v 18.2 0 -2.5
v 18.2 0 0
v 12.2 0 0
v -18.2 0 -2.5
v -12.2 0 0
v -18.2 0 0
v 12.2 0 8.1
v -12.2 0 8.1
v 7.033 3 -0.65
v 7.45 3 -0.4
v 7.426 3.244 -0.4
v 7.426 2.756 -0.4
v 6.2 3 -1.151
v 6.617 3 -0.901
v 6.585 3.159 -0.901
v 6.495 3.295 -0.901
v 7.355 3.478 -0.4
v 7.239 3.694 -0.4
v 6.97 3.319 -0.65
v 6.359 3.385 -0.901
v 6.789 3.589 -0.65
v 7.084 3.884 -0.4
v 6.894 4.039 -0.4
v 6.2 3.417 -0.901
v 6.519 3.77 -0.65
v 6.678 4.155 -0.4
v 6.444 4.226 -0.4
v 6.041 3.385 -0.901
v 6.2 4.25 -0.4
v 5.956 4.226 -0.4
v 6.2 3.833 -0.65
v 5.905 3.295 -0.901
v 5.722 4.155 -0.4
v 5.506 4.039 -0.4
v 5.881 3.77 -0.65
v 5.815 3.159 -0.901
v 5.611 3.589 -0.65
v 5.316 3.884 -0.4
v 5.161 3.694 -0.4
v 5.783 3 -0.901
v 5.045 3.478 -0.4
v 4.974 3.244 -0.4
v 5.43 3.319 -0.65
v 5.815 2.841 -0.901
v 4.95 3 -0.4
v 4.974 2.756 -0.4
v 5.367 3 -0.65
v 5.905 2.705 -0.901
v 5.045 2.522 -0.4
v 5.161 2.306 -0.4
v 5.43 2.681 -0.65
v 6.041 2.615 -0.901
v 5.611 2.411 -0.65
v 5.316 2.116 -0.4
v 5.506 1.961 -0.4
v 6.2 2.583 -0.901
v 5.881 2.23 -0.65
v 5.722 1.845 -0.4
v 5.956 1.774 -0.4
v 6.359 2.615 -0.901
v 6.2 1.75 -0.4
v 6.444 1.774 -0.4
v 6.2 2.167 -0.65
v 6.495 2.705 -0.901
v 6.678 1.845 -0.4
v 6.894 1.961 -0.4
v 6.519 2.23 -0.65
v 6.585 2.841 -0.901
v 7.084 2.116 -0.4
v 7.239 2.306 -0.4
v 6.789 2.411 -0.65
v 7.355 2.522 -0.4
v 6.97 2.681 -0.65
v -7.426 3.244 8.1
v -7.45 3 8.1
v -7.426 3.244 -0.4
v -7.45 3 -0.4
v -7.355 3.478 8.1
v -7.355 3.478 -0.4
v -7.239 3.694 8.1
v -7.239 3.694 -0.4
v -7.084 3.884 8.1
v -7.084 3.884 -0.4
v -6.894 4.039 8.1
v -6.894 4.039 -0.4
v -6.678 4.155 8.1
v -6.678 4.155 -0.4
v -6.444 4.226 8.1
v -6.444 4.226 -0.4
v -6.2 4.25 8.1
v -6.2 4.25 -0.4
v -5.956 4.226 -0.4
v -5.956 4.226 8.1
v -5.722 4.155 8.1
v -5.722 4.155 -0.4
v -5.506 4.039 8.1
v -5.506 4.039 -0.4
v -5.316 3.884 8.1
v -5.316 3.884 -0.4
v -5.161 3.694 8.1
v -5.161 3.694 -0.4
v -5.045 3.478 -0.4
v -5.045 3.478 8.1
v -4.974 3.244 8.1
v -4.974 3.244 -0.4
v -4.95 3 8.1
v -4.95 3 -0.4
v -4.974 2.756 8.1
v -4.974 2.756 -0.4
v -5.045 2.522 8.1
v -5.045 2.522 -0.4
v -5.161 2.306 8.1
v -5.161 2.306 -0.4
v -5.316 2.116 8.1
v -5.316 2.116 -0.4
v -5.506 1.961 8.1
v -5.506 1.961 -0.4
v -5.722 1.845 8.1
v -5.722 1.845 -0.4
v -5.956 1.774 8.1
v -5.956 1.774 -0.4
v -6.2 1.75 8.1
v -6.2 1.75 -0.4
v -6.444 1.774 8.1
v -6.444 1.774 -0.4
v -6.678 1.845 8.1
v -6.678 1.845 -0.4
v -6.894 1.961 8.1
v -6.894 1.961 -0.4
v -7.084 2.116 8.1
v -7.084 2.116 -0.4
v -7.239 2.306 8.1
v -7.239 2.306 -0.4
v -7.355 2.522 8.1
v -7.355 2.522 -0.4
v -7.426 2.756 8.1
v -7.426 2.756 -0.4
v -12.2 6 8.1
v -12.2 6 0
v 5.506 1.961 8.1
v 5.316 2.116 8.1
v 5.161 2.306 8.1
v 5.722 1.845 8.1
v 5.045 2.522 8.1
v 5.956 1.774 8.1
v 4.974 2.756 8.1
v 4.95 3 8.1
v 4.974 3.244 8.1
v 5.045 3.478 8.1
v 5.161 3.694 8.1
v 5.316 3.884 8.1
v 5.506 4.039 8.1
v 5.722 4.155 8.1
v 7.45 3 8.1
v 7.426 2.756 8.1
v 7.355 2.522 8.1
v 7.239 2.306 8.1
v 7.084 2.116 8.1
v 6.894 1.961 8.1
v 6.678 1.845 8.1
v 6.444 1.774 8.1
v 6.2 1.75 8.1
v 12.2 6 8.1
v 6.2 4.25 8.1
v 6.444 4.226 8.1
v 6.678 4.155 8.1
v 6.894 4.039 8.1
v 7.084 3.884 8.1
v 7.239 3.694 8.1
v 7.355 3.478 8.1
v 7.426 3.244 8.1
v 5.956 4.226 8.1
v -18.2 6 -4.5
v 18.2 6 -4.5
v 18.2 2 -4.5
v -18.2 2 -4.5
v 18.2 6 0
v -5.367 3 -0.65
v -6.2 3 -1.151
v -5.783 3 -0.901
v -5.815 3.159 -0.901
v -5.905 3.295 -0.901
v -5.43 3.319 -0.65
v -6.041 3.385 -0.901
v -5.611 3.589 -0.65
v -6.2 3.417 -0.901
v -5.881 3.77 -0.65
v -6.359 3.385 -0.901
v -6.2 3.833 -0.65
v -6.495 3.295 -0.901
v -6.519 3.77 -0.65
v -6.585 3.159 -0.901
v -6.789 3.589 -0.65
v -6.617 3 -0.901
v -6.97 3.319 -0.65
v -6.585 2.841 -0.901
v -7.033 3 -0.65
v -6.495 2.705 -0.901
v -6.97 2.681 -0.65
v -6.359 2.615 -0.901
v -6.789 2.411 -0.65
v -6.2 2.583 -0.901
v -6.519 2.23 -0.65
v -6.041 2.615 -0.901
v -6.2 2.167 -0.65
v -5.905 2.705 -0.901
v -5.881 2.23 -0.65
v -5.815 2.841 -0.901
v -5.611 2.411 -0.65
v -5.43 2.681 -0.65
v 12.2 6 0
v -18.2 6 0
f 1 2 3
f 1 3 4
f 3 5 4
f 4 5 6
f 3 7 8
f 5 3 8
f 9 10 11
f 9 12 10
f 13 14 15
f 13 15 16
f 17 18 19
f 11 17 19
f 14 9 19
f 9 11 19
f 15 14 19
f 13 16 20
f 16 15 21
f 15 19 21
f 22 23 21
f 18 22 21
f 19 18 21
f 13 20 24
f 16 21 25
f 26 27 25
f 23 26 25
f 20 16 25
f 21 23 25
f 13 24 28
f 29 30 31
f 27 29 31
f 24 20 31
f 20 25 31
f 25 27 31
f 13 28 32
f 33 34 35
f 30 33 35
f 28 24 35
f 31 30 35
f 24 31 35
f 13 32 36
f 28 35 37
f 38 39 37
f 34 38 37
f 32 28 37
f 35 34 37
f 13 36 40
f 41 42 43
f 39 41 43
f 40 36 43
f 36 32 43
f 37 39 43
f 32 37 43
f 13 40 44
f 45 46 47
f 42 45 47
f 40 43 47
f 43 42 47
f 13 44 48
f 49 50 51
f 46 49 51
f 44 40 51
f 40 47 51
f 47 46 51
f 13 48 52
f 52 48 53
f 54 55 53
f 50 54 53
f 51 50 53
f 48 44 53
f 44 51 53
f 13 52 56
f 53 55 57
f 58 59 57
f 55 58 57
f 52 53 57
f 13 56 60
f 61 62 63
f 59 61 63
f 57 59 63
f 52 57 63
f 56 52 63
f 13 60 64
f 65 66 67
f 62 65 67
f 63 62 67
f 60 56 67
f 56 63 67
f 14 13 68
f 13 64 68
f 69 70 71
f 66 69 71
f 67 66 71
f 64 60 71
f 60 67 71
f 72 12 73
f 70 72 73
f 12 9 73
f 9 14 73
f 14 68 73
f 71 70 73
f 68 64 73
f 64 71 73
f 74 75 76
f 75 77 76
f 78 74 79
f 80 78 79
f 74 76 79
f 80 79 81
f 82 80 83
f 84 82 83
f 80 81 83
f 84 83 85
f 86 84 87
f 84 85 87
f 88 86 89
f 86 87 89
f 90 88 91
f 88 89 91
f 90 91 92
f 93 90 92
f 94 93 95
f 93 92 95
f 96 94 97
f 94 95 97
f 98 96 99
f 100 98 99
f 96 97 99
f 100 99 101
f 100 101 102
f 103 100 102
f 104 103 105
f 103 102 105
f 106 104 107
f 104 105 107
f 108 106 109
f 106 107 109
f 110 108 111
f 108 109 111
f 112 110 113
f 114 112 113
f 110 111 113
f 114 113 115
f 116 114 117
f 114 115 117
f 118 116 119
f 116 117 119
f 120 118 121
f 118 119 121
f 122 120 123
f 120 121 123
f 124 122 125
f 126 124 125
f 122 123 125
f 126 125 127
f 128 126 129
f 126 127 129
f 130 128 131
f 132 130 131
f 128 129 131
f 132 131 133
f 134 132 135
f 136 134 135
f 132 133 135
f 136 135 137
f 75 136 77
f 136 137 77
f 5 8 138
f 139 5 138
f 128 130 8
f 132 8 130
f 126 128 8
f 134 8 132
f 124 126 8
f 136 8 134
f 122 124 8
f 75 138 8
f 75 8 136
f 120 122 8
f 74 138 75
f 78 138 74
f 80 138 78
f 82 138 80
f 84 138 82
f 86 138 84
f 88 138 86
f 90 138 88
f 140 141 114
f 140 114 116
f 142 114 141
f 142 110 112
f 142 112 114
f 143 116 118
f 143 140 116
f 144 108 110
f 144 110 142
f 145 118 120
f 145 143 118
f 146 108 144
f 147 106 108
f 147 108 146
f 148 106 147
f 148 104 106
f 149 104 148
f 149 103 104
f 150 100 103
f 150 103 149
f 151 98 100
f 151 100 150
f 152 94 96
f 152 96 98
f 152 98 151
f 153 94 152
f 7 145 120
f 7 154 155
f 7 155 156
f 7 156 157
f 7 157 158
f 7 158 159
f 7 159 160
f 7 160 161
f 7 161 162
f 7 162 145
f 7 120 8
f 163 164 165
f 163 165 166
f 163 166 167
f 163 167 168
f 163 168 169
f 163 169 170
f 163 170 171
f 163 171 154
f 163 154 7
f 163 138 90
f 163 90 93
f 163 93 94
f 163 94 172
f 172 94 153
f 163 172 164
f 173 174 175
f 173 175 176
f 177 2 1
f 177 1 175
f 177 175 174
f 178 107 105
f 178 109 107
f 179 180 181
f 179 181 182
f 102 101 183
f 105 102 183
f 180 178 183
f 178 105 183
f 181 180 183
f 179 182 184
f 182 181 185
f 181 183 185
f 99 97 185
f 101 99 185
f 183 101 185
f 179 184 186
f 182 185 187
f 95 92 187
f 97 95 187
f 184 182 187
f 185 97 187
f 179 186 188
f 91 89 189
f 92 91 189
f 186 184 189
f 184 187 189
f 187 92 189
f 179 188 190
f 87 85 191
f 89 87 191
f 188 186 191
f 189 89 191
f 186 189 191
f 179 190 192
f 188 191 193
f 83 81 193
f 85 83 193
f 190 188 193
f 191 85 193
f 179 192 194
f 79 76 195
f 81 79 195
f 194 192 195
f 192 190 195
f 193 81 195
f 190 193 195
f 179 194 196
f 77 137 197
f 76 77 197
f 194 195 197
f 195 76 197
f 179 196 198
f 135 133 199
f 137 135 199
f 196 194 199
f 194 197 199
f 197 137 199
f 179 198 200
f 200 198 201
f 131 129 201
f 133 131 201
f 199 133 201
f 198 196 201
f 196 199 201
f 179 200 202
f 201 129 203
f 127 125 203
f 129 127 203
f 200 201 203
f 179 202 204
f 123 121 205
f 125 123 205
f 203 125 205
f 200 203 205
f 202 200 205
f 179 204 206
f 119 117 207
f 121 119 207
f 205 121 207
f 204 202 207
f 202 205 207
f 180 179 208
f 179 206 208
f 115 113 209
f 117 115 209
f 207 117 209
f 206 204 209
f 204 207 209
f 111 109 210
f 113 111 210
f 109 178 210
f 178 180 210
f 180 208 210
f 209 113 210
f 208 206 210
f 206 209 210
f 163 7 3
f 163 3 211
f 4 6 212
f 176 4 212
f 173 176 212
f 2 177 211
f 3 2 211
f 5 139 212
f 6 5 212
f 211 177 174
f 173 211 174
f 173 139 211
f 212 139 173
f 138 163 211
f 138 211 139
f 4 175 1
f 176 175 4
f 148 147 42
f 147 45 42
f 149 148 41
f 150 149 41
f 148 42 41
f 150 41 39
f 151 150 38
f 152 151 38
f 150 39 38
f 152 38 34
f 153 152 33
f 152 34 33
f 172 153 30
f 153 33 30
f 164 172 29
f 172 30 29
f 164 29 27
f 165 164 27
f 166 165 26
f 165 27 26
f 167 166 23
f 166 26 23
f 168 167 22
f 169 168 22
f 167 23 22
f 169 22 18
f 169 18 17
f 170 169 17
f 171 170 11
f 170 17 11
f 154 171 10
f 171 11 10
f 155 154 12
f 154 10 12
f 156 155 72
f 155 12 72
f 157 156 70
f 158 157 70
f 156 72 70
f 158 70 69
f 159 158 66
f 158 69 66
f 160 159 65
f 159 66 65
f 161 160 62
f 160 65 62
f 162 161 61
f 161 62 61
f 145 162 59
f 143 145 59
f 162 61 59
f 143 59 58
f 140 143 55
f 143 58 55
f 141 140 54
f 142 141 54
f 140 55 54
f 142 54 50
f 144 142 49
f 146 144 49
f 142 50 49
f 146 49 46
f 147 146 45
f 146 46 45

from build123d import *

# Parameters (mm, degrees)
ESBO_O1_W                     = 24.4
ESBO_O1_H                     = 6
RESSALTO_EXTRUS_O1_DEPTH      = 8.1
ESBO_O3_W                     = 36.4
ESBO_O3_H                     = 6
RESSALTO_EXTRUS_O2_DEPTH      = 4.5
CHANFRO1_SIZE                 = 2
FURO_ROSCADO_DE_M3X0_51_D     = 2.5
FURO_ROSCADO_DE_M3X0_51_DEPTH = 8.5
FURO_ROSCADO_DE_M3X0_51_TIP   = 0.751075774


with BuildPart() as part:
    # Esboço1 → Ressalto-extrusão1 (new body)
    with BuildSketch(Plane.XY):
        with Locations((0, 3)):
            Rectangle(ESBO_O1_W, ESBO_O1_H)
    extrude(amount=RESSALTO_EXTRUS_O1_DEPTH)

    # Esboço3 → Ressalto-extrusão2 (add)
    with BuildSketch(Plane(origin=(0, 0, 0), x_dir=(-1, 0, 0), z_dir=(0, 0, -1))):
        with Locations((0, 3)):
            Rectangle(ESBO_O3_W, ESBO_O3_H)
    extrude(amount=RESSALTO_EXTRUS_O2_DEPTH)

    # Chanfro1
    chanfro1_edges = [part.edges().sort_by_distance(p)[0] for p in [
        (0, 0, -4.5),
    ]]
    chamfer(chanfro1_edges, length=CHANFRO1_SIZE)

    # Furo roscado de M3x0.51
    with Locations(Plane.XY.offset(8.1)):
        with Locations((-6.2, 3), (6.2, 3)):
            Hole(FURO_ROSCADO_DE_M3X0_51_D / 2, depth=FURO_ROSCADO_DE_M3X0_51_DEPTH)
            with Locations((0, 0, -(FURO_ROSCADO_DE_M3X0_51_DEPTH + FURO_ROSCADO_DE_M3X0_51_TIP / 2))):  # 118° drill point
                Cone(0, FURO_ROSCADO_DE_M3X0_51_D / 2, FURO_ROSCADO_DE_M3X0_51_TIP, mode=Mode.SUBTRACT)


solid = part.part
